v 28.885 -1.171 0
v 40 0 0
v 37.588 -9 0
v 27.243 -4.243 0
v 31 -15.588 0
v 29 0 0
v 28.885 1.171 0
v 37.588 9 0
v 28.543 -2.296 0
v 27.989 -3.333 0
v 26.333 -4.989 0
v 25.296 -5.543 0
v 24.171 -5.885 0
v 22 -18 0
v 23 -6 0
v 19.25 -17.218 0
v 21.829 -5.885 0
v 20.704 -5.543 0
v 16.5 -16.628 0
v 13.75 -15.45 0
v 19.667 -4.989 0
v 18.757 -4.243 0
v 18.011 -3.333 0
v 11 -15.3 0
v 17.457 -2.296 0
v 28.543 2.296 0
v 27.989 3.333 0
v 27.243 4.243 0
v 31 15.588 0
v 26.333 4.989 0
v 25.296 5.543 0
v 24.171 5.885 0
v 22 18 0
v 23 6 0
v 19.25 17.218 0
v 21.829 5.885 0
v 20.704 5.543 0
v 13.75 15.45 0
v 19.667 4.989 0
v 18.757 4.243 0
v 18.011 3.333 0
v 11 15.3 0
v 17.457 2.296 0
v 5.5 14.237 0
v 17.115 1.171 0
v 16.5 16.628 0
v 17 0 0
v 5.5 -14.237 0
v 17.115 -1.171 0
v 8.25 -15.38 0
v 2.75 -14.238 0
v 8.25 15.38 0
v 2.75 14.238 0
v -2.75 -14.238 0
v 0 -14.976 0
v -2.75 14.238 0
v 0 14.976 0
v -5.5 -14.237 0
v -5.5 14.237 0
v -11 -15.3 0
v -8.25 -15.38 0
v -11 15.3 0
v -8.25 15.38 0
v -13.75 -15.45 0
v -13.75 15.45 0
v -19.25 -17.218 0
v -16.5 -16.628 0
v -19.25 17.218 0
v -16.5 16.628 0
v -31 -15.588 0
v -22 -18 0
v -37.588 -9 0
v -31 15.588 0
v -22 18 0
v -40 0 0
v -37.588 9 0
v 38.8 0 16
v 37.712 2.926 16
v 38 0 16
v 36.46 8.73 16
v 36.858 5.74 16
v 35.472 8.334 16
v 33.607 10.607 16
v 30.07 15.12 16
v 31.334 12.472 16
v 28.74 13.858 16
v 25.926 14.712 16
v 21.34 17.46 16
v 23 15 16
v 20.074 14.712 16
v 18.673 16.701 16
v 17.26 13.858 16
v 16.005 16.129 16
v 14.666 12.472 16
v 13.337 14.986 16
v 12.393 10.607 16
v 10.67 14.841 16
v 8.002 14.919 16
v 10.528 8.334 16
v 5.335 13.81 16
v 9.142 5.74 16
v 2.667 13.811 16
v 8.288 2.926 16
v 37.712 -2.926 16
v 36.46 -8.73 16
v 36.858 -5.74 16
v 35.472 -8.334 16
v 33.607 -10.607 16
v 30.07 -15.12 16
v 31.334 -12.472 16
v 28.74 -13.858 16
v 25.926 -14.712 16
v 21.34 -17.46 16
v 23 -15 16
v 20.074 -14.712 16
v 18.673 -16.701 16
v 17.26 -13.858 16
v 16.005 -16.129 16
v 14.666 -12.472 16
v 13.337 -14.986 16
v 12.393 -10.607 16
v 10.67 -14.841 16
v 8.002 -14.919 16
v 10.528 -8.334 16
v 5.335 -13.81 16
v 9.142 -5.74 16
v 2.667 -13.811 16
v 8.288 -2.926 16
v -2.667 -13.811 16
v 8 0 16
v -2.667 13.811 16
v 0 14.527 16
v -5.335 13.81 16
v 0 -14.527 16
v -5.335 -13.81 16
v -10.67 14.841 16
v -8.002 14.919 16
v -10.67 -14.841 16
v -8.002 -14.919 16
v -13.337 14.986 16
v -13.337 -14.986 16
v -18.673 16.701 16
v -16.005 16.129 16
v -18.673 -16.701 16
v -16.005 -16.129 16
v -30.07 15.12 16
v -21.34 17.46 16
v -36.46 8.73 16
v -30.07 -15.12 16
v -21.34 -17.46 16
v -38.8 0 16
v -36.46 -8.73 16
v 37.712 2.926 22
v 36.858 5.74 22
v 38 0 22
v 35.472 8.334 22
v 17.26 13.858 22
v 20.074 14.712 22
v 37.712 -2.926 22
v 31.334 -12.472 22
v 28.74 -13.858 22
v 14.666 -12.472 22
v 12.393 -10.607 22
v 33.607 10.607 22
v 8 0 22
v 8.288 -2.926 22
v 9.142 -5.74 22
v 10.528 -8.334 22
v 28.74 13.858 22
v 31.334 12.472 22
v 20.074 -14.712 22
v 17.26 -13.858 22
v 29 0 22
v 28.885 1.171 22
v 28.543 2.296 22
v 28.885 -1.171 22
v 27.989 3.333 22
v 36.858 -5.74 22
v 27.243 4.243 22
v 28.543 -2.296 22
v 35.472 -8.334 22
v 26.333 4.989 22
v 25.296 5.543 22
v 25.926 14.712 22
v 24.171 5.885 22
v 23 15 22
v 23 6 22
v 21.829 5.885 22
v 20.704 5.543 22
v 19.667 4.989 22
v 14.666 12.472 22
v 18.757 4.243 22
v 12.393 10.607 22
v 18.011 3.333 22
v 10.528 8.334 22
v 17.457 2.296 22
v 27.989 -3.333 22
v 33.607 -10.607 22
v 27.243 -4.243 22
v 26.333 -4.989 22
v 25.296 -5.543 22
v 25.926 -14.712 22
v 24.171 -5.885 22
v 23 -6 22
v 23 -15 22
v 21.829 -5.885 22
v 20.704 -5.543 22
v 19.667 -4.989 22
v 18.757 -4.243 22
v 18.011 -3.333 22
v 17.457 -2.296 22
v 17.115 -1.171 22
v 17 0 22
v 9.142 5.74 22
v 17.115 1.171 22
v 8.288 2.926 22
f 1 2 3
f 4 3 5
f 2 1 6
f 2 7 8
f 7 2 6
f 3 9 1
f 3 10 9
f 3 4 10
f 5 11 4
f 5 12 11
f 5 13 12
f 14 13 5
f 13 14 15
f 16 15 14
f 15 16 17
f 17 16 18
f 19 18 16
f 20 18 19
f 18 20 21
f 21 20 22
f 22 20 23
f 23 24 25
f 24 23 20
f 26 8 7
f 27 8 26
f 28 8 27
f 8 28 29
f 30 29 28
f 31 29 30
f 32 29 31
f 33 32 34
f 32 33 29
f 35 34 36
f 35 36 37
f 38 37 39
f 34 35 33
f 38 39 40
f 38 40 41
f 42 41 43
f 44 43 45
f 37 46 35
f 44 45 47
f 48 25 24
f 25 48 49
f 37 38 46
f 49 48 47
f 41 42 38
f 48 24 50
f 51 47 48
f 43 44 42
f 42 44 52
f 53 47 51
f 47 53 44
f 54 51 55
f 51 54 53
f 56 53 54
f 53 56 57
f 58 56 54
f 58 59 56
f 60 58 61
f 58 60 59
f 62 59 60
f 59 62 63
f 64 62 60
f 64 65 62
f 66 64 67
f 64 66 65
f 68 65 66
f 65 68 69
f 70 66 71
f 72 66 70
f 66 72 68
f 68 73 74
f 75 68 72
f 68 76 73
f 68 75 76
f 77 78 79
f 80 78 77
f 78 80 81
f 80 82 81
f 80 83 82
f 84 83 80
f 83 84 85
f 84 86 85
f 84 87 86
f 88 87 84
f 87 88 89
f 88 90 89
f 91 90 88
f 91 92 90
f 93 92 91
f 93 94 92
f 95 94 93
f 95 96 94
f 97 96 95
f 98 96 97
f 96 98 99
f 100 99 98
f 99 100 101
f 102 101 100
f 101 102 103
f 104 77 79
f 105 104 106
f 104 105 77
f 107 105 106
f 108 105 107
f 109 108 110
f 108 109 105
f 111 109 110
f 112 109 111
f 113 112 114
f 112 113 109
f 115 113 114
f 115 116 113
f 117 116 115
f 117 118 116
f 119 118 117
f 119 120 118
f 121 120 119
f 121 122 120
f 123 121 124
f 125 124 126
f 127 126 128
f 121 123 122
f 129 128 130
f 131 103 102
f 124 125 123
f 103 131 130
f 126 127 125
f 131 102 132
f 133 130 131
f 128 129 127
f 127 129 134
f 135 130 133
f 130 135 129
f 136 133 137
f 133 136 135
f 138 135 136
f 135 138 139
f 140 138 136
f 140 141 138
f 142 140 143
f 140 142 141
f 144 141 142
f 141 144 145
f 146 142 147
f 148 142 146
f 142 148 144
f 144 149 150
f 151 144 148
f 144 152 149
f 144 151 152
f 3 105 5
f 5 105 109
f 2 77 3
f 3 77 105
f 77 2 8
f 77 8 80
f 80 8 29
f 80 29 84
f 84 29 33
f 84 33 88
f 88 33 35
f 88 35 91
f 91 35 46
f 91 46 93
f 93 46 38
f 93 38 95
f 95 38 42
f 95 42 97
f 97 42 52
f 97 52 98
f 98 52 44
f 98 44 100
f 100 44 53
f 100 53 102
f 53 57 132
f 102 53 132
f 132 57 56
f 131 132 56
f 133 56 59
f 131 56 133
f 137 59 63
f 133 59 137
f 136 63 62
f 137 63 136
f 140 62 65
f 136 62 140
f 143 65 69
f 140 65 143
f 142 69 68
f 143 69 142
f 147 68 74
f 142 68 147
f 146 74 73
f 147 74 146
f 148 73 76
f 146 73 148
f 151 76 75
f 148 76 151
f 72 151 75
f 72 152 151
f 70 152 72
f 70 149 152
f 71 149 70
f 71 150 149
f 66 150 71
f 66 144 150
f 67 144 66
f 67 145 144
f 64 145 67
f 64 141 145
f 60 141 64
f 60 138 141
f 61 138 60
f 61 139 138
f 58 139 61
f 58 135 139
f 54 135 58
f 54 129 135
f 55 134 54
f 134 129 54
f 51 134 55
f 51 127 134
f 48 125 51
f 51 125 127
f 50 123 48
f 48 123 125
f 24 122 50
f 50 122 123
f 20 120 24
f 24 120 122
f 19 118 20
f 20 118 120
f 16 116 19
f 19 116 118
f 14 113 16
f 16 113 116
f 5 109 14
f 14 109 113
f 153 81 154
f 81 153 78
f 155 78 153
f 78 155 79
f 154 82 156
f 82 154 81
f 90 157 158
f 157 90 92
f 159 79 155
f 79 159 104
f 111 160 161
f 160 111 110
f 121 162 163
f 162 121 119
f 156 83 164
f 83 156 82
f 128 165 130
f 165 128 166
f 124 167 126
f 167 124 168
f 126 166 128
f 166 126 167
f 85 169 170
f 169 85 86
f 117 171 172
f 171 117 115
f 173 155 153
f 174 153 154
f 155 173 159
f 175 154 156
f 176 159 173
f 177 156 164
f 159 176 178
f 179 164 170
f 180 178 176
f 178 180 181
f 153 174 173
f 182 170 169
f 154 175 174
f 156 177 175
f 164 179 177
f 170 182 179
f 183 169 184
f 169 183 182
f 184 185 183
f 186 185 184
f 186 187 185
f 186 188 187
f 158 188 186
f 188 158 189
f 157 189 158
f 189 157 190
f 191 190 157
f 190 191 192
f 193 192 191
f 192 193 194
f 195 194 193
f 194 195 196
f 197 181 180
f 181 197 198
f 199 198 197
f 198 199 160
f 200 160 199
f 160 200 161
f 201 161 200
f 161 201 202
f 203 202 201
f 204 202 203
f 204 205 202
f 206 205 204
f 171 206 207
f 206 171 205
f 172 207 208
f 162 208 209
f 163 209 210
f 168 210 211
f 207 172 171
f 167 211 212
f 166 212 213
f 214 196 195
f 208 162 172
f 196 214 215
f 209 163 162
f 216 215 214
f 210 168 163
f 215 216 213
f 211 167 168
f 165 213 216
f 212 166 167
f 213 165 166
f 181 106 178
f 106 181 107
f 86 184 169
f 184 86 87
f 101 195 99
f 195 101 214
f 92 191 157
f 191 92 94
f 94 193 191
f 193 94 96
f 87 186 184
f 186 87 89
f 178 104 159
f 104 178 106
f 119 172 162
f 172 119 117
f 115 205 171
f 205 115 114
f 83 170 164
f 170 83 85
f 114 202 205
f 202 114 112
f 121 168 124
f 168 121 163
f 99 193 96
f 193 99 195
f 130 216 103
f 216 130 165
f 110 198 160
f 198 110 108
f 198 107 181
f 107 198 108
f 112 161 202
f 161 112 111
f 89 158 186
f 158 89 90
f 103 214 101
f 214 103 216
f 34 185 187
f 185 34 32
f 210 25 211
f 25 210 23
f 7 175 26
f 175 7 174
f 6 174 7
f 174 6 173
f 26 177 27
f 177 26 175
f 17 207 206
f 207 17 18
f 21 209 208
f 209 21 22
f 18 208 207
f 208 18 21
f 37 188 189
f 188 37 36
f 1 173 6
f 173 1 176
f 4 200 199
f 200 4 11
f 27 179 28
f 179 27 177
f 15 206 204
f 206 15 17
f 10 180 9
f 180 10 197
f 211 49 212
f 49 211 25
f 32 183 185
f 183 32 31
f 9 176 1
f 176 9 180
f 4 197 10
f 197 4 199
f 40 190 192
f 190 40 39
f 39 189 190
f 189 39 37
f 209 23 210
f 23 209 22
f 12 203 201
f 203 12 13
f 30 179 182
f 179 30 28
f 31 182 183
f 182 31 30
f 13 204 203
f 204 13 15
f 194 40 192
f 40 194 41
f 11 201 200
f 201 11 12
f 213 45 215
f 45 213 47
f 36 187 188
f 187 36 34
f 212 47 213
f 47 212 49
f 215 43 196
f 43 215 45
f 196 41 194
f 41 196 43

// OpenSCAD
$fn = 32;

// ----------------------------------------------------------------------
// Handle: 80 x 36 mm grip, 16 mm thick
// ----------------------------------------------------------------------

// --- parameters (mm) ---
length = 80;              // grip length
width = 36;               // grip width
thickness = 16;           // grip thickness
waist = 0.8;              // width factor at the middle
draft = 0.97;             // top face scale of the extrusion
scallops = 5;             // finger rests per side
ripple = 0.04;            // depth factor of the finger rests
boss_d = 30;              // mounting boss diameter
boss_h = 6;               // mounting boss height
boss_hole_d = 12;         // screw clearance through the boss
boss_r = 23;              // boss centre from the grip centre

/* ergonomic grip outline, closed spline-like polygon in the XY plane */
grip = [[-22, 18], [-19.25, 17.218], [-16.5, 16.628], [-13.75, 15.45], [-11, 15.3], [-8.25, 15.38], [-5.5, 14.237], [-2.75, 14.238], [0, 14.976], [2.75, 14.238], [5.5, 14.237], [8.25, 15.38], [11, 15.3], [13.75, 15.45], [16.5, 16.628], [19.25, 17.218], [22, 18], [31, 15.588], [37.588, 9], [40, 0], [37.588, -9], [31, -15.588], [22, -18], [22, -18], [19.25, -17.218], [16.5, -16.628], [13.75, -15.45], [11, -15.3], [8.25, -15.38], [5.5, -14.237], [2.75, -14.238], [0, -14.976], [-2.75, -14.238], [-5.5, -14.237], [-8.25, -15.38], [-11, -15.3], [-13.75, -15.45], [-16.5, -16.628], [-19.25, -17.218], [-22, -18], [-31, -15.588], [-37.588, -9], [-40, 0], [-37.588, 9], [-31, 15.588], [-22, 18]];

module grip_body() {
  linear_extrude(height = thickness, scale = draft) polygon(grip);
}

module boss_body() {
  /* sunk 1 mm into the grip so the joint overlaps */
  translate([boss_r, 0, thickness - 1]) cylinder(h = boss_h + 1, d = boss_d);
}

difference() {
  union() {
    grip_body();
    boss_body();
  }
  translate([boss_r, 0, -1]) cylinder(h = thickness + boss_h + 2, d = boss_hole_d);
}
